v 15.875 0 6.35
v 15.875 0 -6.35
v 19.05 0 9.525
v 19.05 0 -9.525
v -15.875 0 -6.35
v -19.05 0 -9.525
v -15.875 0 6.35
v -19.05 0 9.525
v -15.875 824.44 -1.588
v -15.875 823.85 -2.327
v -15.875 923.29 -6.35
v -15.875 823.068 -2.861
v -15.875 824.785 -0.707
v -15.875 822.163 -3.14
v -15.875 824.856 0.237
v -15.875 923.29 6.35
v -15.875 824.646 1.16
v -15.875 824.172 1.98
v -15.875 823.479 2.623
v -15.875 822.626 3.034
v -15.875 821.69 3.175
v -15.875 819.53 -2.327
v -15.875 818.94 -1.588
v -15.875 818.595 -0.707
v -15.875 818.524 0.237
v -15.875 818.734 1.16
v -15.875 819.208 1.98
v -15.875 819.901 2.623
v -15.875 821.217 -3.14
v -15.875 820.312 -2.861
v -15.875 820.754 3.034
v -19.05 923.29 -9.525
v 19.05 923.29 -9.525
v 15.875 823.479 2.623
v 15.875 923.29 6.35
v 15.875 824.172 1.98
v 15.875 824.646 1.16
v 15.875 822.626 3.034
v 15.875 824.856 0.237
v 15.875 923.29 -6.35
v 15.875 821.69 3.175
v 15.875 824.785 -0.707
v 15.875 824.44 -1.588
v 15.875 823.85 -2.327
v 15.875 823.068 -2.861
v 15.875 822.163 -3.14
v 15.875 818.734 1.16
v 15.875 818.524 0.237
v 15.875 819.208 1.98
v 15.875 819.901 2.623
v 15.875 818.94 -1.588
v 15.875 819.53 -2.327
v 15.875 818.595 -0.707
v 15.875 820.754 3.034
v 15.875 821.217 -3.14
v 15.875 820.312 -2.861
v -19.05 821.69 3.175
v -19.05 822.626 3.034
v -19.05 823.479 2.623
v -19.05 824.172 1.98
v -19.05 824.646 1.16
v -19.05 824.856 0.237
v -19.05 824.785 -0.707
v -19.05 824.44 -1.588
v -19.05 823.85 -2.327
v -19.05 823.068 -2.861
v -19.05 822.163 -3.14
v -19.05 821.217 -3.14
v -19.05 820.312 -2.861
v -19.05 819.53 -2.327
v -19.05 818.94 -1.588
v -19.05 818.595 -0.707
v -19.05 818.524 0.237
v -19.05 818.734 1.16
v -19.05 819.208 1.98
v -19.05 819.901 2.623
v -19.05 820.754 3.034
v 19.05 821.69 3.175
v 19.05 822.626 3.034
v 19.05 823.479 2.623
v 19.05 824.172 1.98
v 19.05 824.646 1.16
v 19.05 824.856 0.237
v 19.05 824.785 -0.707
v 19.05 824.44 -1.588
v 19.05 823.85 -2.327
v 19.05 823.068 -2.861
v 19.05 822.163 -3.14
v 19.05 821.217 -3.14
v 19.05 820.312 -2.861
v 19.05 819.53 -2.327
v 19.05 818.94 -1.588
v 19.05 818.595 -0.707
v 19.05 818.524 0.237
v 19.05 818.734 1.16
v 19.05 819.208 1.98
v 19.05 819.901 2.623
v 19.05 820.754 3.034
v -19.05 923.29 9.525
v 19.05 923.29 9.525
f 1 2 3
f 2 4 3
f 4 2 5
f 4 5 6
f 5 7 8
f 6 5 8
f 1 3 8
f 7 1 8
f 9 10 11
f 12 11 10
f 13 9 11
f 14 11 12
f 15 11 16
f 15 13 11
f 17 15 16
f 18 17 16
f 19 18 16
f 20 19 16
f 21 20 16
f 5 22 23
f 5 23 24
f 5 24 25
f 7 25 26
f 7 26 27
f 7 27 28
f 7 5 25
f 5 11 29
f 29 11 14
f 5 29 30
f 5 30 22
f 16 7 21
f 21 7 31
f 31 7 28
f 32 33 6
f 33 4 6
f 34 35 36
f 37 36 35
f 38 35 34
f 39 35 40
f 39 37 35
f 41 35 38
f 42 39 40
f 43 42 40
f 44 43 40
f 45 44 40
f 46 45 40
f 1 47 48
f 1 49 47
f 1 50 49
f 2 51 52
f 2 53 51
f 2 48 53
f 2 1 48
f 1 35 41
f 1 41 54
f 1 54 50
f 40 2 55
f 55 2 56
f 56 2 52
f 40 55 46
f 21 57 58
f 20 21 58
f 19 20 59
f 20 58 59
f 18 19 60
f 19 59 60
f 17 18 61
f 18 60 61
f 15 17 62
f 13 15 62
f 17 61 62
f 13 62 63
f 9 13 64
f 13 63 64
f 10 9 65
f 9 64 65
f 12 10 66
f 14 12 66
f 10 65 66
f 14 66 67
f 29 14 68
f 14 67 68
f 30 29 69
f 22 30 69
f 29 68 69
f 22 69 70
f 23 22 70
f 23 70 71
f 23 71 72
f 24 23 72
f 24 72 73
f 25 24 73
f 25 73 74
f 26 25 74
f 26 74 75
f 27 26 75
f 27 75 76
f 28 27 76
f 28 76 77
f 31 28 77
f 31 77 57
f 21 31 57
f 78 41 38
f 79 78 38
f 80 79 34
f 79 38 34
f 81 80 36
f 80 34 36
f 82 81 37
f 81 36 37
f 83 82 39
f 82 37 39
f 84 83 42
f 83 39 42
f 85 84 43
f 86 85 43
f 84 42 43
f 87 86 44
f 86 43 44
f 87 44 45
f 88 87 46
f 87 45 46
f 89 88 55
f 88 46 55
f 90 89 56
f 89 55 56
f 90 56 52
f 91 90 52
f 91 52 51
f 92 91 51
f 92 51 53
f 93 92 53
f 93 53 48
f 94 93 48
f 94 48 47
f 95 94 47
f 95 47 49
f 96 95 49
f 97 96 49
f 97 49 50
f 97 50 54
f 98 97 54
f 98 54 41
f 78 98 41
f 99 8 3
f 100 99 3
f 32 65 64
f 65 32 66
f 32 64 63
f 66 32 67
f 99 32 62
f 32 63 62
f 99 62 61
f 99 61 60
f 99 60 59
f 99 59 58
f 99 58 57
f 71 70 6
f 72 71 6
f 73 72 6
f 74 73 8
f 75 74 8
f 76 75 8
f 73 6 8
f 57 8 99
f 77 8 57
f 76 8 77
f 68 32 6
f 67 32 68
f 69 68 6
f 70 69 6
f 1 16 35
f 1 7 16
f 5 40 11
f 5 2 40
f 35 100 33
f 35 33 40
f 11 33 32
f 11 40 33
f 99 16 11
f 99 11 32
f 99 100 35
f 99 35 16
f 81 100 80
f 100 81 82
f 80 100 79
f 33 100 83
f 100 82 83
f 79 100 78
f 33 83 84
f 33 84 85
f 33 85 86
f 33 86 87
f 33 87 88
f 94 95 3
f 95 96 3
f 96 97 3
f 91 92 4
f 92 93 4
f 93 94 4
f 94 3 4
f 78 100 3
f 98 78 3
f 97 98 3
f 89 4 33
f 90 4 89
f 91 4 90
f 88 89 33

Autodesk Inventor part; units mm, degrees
ref_plane "YZ Plane" through (0, 0, 0) normal (1, 0, 0) x (0, 1, 0)
ref_plane "XZ Plane" through (0, 0, 0) normal (0, 1, 0) x (-1, 0, 0)
ref_plane "XY Plane" through (0, 0, 0) normal (0, 0, 1) x (1, 0, 0)
sketch "Sketch5" plane through (0, 0, 0) normal (0, 1, 0) x (-1, 0, 0)
  line L0 (19.05, 9.525) -> (-19.05, 9.525)
  line L1 (-19.05, 9.525) -> (-19.05, -9.525)
  line L2 (-19.05, -9.525) -> (19.05, -9.525)
  line L3 (19.05, -9.525) -> (19.05, 9.525)
  line L4 (19.05, 9.525) -> (-19.05, -9.525) construction
  line L5 (-19.05, 9.525) -> (19.05, -9.525) construction
  line L6 (15.875, 6.35) -> (-15.875, 6.35)
  line L7 (-15.875, 6.35) -> (-15.875, -6.35)
  line L8 (-15.875, -6.35) -> (15.875, -6.35)
  line L9 (15.875, -6.35) -> (15.875, 6.35)
  line L10 (15.875, 6.35) -> (-15.875, -6.35) construction
  line L11 (-15.875, 6.35) -> (15.875, -6.35) construction
  point P0 (0, 0)
  dimension "d11" = 19.05
  dimension "d12" = 38.1
  dimension "d13" = 3.175
  dimension "d14" = 3.175
extrude "Extrusion4" add sketch "Sketch5" along normal blind 923.29
sketch "Sketch6" plane through (-19.05, 0, 9.525) normal (-1, 0, 0) x (0, 0, 1)
  circle A0 centre (-9.525, 821.69) radius 3.175
  line L0 (-19.05, 923.29) -> (0, 923.29) projected
  point P0 (-9.525, 0)
  dimension "d17" = 6.35
  dimension "d18" = 101.6
extrude "Extrusion6" cut sketch "Sketch6" against normal through all
equation "\"d11\" = tubeWidth"
equation "\"d12\" = tubeBreadth"
equation "\"d13\" = tubeMaterialThickness"
equation "\"d14\" = tubeMaterialThickness"
equation "\"d15\" = tubeLength"
equation "\"d17\" = endOfTravelPostDiam"
equation "\"d18\" = endOfTravellDistanceFromBottom"
equation "\"tubeBreadth\" = 38.1"
equation "\"tubeMaterialThickness\" = 3.175"
equation "\"tubeLength\" = 923.29"
equation "\"tubeWidth\" = 19.05"
equation "\"endOfTravelPostDiam\" = 6.35"
equation "\"endOfTravellDistanceFromBottom\" = 101.6"
properties part number "InnerTube" material "Aluminum 6061"
